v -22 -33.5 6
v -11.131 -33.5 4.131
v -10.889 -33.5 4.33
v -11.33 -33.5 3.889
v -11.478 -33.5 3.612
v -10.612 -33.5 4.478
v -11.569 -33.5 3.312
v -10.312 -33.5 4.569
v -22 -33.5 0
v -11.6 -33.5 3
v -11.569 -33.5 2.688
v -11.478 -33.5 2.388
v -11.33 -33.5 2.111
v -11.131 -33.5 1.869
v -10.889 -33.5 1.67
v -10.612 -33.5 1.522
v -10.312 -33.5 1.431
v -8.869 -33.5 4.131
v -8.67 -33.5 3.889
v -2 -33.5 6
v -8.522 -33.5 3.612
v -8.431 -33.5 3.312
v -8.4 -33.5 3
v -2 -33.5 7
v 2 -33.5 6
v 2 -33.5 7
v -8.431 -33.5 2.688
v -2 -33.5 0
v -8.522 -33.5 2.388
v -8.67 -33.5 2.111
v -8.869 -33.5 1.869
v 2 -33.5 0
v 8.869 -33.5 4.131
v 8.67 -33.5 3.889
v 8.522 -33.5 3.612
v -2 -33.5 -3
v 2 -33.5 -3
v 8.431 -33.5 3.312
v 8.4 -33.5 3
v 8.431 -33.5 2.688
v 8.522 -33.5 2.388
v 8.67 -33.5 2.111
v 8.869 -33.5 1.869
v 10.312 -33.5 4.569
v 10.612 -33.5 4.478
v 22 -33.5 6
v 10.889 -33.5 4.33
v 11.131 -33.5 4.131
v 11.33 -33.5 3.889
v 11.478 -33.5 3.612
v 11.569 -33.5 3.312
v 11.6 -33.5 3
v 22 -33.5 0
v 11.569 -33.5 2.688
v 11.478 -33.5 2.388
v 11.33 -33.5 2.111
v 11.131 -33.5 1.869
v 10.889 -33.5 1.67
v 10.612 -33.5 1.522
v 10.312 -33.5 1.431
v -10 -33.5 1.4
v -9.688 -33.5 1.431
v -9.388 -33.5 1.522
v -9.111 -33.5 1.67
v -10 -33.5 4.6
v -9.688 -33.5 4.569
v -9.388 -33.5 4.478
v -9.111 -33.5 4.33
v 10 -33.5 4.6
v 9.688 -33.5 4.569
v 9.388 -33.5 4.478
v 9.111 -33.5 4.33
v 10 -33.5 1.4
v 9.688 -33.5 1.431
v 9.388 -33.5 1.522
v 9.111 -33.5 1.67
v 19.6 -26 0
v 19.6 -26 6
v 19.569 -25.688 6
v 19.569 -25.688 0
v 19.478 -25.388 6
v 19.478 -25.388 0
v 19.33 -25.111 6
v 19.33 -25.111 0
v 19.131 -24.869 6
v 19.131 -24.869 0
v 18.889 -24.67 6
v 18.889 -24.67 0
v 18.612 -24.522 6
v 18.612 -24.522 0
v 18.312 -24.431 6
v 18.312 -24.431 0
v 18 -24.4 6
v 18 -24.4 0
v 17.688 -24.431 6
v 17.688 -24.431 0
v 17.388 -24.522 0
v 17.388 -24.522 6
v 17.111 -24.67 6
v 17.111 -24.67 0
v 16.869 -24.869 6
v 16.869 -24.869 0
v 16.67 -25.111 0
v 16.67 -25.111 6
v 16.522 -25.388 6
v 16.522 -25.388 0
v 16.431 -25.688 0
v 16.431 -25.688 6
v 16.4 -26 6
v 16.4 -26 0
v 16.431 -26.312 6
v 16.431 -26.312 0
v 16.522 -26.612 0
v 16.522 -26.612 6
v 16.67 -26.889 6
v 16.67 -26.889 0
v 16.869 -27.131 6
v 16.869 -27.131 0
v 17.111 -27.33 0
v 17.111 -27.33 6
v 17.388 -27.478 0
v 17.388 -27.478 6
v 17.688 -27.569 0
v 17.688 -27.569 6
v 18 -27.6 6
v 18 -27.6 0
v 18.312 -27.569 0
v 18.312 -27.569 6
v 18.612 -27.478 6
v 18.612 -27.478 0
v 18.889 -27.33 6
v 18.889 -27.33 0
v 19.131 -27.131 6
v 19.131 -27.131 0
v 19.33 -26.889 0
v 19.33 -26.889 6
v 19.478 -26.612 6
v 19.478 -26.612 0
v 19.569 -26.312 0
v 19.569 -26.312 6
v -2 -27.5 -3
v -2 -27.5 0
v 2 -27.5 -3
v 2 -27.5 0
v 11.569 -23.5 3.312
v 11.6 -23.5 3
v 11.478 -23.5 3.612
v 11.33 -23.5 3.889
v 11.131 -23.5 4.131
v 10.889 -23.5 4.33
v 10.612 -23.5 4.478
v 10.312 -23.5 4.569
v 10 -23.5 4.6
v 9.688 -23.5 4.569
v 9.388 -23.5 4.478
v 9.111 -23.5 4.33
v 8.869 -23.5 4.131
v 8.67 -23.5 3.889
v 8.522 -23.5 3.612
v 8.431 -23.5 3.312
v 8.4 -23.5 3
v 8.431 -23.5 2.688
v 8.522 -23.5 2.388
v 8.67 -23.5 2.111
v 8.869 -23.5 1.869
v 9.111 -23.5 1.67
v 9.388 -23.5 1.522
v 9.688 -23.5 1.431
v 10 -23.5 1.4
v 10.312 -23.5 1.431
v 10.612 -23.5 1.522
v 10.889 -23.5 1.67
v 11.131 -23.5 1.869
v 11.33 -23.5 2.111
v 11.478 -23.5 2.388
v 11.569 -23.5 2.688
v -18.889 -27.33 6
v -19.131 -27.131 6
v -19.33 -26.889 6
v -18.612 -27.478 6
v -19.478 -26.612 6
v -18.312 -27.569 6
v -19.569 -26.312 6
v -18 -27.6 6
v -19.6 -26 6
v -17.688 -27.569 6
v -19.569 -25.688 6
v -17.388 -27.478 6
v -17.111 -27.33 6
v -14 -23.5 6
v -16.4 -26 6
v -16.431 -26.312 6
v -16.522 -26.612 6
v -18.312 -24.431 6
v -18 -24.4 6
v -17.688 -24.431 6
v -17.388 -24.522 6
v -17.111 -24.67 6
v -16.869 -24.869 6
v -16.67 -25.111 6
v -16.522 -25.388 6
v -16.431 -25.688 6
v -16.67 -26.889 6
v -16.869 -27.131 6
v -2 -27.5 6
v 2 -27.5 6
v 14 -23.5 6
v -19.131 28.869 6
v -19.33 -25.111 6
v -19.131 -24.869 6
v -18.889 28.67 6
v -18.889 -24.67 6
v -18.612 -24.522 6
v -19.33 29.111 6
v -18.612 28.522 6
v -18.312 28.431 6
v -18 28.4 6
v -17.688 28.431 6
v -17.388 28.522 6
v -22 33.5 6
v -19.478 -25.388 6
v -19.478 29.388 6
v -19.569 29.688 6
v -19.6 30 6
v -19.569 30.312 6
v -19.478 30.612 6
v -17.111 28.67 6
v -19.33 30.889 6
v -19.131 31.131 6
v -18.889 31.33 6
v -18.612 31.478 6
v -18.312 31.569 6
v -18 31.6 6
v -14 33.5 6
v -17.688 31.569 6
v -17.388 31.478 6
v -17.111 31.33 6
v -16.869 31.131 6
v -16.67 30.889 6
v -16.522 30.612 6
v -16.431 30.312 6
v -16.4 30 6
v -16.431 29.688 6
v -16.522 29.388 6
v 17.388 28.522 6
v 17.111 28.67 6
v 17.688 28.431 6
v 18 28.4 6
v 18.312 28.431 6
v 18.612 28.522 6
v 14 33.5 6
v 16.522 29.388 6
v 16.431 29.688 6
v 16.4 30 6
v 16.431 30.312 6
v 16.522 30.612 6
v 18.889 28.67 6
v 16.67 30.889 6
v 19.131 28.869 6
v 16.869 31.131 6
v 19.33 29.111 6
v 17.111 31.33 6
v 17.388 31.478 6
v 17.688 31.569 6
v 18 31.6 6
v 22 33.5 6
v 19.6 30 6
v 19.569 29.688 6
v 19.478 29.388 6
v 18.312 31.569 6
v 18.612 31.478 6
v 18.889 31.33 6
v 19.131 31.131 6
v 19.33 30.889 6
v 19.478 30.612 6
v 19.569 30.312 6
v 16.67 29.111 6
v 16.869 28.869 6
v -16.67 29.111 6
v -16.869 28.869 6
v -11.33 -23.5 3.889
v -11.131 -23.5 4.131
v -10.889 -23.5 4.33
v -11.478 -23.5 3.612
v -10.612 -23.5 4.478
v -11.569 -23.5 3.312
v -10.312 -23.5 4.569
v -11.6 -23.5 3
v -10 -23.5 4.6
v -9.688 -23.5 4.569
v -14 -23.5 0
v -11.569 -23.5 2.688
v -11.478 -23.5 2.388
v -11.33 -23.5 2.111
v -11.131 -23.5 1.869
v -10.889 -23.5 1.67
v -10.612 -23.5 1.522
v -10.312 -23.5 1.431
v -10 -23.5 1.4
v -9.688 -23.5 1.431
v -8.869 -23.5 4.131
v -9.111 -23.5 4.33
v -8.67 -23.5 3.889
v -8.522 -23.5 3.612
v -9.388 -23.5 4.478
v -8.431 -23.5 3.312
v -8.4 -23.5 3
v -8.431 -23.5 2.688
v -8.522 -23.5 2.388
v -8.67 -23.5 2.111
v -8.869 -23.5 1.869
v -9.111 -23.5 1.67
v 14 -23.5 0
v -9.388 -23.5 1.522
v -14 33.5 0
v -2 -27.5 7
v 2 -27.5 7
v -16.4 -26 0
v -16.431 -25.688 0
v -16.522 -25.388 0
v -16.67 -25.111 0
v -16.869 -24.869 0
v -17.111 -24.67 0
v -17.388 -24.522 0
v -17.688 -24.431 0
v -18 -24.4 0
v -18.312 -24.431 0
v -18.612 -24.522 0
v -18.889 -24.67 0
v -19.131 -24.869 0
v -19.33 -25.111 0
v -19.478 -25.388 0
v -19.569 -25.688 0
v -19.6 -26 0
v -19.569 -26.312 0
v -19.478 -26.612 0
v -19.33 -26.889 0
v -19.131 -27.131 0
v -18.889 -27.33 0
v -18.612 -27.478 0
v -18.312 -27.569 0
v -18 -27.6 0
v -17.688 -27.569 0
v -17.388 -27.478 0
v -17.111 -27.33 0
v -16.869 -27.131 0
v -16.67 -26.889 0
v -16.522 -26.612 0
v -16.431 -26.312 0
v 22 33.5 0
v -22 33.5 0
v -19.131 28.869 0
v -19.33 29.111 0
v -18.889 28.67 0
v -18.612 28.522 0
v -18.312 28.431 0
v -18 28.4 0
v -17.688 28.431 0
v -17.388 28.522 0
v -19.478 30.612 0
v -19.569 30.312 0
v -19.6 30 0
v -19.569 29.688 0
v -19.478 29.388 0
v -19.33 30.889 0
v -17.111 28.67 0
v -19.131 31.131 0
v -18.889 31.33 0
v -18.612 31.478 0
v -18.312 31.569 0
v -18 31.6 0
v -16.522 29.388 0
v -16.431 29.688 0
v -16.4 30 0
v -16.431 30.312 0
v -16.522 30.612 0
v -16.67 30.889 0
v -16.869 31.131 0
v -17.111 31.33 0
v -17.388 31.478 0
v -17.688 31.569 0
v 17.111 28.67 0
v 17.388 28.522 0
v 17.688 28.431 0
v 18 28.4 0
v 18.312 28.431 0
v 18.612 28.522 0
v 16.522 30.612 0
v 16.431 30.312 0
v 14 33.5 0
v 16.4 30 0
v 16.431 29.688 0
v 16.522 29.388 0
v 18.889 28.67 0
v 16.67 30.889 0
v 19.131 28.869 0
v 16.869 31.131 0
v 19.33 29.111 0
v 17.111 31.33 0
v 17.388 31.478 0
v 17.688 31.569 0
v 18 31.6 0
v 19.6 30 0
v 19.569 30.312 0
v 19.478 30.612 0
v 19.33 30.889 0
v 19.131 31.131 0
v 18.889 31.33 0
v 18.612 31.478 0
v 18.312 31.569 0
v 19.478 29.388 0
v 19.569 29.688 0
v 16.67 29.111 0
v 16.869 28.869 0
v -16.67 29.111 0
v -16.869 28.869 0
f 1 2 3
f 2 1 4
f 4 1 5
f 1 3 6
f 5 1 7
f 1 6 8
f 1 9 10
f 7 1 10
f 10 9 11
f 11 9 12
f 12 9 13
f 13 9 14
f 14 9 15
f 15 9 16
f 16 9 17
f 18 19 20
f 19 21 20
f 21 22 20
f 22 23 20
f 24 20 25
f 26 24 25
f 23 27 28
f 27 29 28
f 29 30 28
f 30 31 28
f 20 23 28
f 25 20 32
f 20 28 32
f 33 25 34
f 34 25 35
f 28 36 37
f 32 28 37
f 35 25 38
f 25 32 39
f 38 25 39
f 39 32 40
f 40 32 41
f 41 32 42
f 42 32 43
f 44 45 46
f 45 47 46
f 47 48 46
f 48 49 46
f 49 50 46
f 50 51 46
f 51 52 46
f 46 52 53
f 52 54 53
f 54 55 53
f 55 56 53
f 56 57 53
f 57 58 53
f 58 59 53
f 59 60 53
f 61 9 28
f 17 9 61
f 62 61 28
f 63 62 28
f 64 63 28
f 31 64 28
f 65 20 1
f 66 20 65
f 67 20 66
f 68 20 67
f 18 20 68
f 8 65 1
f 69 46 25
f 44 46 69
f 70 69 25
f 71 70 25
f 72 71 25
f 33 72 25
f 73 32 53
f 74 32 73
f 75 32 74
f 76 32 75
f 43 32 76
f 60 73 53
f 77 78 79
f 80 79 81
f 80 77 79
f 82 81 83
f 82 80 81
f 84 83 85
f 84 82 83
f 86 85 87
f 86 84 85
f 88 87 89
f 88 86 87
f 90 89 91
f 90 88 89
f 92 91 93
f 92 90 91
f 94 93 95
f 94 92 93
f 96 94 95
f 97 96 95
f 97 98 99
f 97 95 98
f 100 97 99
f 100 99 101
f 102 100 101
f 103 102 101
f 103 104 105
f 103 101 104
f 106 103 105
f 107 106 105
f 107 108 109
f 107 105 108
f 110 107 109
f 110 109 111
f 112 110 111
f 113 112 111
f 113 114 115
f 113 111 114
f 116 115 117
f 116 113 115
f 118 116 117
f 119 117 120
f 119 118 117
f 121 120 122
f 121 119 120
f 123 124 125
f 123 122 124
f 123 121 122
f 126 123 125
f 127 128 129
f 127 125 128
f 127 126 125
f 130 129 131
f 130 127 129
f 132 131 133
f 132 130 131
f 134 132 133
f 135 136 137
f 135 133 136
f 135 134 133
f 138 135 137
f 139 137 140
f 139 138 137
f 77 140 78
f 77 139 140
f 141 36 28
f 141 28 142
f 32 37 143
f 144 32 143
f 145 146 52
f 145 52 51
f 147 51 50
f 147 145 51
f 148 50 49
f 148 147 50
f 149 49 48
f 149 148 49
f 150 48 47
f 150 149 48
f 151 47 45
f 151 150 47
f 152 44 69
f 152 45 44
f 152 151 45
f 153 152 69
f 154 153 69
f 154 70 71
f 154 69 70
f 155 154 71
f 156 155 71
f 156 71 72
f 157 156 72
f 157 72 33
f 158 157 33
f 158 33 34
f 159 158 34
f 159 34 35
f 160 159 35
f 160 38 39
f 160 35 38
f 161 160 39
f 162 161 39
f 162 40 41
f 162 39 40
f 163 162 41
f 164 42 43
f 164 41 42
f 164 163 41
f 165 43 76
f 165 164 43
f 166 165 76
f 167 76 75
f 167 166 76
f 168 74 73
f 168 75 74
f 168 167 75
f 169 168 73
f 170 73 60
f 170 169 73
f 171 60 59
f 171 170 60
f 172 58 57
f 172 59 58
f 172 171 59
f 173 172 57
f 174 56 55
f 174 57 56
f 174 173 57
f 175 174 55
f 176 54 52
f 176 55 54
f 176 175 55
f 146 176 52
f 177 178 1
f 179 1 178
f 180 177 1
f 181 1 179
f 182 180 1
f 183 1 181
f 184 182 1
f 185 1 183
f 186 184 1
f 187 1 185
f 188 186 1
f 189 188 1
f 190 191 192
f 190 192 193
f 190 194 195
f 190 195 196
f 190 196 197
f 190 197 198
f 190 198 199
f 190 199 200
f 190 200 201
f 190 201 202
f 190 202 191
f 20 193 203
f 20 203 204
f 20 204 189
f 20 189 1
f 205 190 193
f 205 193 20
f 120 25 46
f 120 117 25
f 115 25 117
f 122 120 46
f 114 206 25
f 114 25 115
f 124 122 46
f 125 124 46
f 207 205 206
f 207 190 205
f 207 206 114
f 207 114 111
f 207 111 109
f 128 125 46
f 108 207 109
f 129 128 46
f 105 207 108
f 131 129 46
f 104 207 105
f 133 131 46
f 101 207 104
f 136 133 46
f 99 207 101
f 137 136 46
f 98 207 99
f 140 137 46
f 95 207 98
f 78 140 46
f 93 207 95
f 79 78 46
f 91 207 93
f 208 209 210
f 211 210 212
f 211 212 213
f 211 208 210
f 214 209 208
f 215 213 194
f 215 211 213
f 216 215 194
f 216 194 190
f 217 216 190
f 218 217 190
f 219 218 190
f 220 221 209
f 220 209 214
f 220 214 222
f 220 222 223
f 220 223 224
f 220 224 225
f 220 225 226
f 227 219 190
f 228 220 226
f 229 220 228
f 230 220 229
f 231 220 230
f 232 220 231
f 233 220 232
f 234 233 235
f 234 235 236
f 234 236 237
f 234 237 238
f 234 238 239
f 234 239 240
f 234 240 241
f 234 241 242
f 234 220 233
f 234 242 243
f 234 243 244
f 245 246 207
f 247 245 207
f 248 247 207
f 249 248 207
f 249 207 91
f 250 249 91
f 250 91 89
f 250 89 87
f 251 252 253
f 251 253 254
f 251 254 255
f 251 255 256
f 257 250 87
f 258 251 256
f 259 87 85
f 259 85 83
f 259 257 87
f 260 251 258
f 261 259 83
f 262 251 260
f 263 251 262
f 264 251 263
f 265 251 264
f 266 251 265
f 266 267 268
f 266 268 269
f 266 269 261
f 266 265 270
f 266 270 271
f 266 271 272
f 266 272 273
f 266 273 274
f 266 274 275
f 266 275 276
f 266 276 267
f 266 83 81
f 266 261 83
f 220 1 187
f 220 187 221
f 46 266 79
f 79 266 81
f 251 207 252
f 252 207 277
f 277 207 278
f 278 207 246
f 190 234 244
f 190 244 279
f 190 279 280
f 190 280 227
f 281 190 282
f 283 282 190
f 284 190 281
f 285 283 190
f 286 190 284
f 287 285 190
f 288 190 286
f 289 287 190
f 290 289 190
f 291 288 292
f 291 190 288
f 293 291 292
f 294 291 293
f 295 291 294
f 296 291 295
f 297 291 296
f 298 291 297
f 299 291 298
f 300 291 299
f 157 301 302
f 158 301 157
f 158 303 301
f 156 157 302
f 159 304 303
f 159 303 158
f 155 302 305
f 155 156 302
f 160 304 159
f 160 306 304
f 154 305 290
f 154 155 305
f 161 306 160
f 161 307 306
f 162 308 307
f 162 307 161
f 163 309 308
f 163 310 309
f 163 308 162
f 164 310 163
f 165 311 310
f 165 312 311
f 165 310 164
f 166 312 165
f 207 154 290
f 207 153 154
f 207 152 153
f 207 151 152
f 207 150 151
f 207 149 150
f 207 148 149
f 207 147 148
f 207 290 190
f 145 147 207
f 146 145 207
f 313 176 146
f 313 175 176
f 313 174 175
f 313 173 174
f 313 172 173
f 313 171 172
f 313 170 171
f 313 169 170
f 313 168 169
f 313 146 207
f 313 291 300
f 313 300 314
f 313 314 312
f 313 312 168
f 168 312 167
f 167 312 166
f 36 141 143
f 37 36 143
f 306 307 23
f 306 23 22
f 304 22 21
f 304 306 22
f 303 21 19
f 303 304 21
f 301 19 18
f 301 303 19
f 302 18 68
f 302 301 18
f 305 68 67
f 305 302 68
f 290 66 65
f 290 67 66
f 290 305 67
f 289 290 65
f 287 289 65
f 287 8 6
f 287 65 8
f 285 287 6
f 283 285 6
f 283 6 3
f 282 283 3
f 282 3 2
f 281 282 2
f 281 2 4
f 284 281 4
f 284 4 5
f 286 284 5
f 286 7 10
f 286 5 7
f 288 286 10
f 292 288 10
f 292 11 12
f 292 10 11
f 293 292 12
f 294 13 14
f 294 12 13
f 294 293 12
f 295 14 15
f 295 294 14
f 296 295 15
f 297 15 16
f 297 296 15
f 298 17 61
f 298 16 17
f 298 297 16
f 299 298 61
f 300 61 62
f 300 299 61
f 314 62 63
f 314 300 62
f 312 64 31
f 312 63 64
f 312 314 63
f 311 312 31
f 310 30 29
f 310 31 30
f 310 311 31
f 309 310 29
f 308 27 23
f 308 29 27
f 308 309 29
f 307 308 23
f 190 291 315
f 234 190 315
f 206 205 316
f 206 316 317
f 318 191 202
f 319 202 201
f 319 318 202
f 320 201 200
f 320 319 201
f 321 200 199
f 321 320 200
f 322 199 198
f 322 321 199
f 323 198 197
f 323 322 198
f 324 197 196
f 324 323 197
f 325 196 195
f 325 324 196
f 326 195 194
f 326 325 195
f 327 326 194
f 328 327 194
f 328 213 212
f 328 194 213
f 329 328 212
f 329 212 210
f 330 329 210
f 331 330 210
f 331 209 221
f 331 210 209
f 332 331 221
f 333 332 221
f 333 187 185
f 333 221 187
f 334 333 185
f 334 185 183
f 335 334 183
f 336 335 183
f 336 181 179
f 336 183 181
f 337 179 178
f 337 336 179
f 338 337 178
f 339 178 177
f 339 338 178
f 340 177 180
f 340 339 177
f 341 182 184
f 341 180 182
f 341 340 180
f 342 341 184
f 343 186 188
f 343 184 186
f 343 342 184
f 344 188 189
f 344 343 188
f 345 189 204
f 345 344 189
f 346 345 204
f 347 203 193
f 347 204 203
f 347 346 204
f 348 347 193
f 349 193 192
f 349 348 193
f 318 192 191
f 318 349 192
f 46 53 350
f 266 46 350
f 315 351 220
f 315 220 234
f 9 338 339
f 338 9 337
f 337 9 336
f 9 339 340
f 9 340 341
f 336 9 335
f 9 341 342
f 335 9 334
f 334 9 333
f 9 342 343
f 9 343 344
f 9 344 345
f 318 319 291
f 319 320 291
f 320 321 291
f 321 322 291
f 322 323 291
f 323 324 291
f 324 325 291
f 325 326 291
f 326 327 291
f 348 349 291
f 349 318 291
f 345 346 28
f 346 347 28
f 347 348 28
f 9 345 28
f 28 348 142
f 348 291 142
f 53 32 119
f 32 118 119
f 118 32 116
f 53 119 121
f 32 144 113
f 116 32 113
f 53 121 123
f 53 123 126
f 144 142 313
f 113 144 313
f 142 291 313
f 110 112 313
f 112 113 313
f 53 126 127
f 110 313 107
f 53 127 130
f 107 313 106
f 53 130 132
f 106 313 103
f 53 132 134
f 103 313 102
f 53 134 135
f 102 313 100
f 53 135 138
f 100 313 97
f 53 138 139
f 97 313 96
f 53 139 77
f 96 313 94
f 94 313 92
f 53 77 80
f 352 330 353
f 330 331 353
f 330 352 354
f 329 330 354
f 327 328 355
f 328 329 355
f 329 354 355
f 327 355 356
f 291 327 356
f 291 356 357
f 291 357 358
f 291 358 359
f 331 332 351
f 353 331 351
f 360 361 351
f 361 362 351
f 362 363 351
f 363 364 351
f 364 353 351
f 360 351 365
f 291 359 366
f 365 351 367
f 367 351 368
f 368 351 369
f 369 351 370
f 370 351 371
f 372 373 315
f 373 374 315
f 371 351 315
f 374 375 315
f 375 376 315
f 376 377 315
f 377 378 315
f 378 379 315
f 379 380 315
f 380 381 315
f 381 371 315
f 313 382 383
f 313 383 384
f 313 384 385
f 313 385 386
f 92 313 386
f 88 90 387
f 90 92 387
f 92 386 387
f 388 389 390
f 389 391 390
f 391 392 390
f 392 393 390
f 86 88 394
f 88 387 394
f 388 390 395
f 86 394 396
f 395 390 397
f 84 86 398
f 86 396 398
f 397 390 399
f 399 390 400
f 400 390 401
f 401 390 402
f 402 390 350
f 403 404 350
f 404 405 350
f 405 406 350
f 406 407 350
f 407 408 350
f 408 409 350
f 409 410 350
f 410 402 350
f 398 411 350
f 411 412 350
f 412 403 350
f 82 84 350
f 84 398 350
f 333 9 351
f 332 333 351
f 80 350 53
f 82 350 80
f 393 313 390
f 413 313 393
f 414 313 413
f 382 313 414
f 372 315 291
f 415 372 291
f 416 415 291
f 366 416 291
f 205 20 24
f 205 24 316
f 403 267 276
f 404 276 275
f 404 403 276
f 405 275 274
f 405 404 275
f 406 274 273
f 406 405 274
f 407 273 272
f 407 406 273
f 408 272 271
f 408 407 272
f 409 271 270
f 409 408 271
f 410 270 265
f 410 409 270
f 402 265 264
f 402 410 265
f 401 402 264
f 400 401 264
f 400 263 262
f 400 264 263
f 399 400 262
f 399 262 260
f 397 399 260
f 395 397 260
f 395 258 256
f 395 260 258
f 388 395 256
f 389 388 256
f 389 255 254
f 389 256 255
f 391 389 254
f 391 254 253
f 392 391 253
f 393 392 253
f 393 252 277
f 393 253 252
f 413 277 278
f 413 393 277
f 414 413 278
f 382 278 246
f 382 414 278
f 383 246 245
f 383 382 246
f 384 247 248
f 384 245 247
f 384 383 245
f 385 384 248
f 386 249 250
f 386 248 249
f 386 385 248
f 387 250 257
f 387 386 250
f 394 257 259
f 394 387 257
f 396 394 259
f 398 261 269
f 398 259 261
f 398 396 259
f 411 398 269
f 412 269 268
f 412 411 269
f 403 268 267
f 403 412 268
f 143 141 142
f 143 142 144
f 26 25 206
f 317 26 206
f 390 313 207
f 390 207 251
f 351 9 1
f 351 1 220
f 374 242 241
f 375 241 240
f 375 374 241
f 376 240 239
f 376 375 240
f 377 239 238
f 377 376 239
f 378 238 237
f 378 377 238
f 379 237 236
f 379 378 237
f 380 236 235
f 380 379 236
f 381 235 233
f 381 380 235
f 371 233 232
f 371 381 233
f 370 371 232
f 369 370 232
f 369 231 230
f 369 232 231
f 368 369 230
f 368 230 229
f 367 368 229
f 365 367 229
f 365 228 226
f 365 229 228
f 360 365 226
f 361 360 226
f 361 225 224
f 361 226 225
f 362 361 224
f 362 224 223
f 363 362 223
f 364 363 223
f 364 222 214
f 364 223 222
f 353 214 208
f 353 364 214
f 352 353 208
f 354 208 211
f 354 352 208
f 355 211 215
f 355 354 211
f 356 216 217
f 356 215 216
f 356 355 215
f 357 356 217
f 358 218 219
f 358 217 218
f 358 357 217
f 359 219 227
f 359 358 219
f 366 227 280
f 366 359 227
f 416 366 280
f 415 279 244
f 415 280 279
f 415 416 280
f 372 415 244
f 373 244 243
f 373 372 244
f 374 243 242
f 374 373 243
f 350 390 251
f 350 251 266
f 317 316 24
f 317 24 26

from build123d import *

# Parameters (mm, degrees)
SKETCH_W             = 44
SKETCH_H             = 67
PAD_DEPTH            = 6
SKETCH001_W          = 28
SKETCH001_H          = 60
POCKET_DEPTH         = 0.001
POCKET_DEPTH_BACK    = -6.001
BOX_W                = 4
BOX_H                = 6
BOX_DEPTH            = 10
SKETCH003_R          = 1.6
POCKET002_DEPTH      = 3.001
POCKET002_DEPTH_BACK = -7.001
SKETCH004_R          = 1.6
POCKET003_DEPTH      = 33.501


with BuildPart() as part:
    # Sketch → Pad (new body)
    with BuildSketch(Plane.XY):
        Rectangle(SKETCH_W, SKETCH_H)
    extrude(amount=PAD_DEPTH)

    # Sketch001 → Pocket (cut, two sides)
    with BuildSketch(Plane.XY) as pocket_sk:
        with Locations((0, 6.5)):
            Rectangle(SKETCH001_W, SKETCH001_H)
    extrude(amount=-POCKET_DEPTH, mode=Mode.SUBTRACT)
    extrude(pocket_sk.sketch, amount=-POCKET_DEPTH_BACK, mode=Mode.SUBTRACT)

    # Box → Box (join)
    with BuildSketch(Plane(origin=(-2, -33.5, -3), x_dir=(1, 0, 0), z_dir=(0, 0, 1))):
        with Locations((2, 3)):
            Rectangle(BOX_W, BOX_H)
    extrude(amount=BOX_DEPTH)

    # Sketch003 → Pocket002 (cut, two sides)
    with BuildSketch(Plane.XY) as pocket002_sk:
        with Locations((-18, 30)):
            Circle(SKETCH003_R)
        with Locations((-18, -26)):
            Circle(SKETCH003_R)
        with Locations((18, 30)):
            Circle(SKETCH003_R)
        with Locations((18, -26)):
            Circle(SKETCH003_R)
    extrude(amount=-POCKET002_DEPTH, mode=Mode.SUBTRACT)
    extrude(pocket002_sk.sketch, amount=-POCKET002_DEPTH_BACK, mode=Mode.SUBTRACT)

    # Sketch004 → Pocket003 (cut, through all)
    with BuildSketch(Plane.XZ):
        with Locations((10, 3)):
            Circle(SKETCH004_R)
        with Locations((-10, 3)):
            Circle(SKETCH004_R)
    extrude(amount=POCKET003_DEPTH, mode=Mode.SUBTRACT)


solid = part.part
